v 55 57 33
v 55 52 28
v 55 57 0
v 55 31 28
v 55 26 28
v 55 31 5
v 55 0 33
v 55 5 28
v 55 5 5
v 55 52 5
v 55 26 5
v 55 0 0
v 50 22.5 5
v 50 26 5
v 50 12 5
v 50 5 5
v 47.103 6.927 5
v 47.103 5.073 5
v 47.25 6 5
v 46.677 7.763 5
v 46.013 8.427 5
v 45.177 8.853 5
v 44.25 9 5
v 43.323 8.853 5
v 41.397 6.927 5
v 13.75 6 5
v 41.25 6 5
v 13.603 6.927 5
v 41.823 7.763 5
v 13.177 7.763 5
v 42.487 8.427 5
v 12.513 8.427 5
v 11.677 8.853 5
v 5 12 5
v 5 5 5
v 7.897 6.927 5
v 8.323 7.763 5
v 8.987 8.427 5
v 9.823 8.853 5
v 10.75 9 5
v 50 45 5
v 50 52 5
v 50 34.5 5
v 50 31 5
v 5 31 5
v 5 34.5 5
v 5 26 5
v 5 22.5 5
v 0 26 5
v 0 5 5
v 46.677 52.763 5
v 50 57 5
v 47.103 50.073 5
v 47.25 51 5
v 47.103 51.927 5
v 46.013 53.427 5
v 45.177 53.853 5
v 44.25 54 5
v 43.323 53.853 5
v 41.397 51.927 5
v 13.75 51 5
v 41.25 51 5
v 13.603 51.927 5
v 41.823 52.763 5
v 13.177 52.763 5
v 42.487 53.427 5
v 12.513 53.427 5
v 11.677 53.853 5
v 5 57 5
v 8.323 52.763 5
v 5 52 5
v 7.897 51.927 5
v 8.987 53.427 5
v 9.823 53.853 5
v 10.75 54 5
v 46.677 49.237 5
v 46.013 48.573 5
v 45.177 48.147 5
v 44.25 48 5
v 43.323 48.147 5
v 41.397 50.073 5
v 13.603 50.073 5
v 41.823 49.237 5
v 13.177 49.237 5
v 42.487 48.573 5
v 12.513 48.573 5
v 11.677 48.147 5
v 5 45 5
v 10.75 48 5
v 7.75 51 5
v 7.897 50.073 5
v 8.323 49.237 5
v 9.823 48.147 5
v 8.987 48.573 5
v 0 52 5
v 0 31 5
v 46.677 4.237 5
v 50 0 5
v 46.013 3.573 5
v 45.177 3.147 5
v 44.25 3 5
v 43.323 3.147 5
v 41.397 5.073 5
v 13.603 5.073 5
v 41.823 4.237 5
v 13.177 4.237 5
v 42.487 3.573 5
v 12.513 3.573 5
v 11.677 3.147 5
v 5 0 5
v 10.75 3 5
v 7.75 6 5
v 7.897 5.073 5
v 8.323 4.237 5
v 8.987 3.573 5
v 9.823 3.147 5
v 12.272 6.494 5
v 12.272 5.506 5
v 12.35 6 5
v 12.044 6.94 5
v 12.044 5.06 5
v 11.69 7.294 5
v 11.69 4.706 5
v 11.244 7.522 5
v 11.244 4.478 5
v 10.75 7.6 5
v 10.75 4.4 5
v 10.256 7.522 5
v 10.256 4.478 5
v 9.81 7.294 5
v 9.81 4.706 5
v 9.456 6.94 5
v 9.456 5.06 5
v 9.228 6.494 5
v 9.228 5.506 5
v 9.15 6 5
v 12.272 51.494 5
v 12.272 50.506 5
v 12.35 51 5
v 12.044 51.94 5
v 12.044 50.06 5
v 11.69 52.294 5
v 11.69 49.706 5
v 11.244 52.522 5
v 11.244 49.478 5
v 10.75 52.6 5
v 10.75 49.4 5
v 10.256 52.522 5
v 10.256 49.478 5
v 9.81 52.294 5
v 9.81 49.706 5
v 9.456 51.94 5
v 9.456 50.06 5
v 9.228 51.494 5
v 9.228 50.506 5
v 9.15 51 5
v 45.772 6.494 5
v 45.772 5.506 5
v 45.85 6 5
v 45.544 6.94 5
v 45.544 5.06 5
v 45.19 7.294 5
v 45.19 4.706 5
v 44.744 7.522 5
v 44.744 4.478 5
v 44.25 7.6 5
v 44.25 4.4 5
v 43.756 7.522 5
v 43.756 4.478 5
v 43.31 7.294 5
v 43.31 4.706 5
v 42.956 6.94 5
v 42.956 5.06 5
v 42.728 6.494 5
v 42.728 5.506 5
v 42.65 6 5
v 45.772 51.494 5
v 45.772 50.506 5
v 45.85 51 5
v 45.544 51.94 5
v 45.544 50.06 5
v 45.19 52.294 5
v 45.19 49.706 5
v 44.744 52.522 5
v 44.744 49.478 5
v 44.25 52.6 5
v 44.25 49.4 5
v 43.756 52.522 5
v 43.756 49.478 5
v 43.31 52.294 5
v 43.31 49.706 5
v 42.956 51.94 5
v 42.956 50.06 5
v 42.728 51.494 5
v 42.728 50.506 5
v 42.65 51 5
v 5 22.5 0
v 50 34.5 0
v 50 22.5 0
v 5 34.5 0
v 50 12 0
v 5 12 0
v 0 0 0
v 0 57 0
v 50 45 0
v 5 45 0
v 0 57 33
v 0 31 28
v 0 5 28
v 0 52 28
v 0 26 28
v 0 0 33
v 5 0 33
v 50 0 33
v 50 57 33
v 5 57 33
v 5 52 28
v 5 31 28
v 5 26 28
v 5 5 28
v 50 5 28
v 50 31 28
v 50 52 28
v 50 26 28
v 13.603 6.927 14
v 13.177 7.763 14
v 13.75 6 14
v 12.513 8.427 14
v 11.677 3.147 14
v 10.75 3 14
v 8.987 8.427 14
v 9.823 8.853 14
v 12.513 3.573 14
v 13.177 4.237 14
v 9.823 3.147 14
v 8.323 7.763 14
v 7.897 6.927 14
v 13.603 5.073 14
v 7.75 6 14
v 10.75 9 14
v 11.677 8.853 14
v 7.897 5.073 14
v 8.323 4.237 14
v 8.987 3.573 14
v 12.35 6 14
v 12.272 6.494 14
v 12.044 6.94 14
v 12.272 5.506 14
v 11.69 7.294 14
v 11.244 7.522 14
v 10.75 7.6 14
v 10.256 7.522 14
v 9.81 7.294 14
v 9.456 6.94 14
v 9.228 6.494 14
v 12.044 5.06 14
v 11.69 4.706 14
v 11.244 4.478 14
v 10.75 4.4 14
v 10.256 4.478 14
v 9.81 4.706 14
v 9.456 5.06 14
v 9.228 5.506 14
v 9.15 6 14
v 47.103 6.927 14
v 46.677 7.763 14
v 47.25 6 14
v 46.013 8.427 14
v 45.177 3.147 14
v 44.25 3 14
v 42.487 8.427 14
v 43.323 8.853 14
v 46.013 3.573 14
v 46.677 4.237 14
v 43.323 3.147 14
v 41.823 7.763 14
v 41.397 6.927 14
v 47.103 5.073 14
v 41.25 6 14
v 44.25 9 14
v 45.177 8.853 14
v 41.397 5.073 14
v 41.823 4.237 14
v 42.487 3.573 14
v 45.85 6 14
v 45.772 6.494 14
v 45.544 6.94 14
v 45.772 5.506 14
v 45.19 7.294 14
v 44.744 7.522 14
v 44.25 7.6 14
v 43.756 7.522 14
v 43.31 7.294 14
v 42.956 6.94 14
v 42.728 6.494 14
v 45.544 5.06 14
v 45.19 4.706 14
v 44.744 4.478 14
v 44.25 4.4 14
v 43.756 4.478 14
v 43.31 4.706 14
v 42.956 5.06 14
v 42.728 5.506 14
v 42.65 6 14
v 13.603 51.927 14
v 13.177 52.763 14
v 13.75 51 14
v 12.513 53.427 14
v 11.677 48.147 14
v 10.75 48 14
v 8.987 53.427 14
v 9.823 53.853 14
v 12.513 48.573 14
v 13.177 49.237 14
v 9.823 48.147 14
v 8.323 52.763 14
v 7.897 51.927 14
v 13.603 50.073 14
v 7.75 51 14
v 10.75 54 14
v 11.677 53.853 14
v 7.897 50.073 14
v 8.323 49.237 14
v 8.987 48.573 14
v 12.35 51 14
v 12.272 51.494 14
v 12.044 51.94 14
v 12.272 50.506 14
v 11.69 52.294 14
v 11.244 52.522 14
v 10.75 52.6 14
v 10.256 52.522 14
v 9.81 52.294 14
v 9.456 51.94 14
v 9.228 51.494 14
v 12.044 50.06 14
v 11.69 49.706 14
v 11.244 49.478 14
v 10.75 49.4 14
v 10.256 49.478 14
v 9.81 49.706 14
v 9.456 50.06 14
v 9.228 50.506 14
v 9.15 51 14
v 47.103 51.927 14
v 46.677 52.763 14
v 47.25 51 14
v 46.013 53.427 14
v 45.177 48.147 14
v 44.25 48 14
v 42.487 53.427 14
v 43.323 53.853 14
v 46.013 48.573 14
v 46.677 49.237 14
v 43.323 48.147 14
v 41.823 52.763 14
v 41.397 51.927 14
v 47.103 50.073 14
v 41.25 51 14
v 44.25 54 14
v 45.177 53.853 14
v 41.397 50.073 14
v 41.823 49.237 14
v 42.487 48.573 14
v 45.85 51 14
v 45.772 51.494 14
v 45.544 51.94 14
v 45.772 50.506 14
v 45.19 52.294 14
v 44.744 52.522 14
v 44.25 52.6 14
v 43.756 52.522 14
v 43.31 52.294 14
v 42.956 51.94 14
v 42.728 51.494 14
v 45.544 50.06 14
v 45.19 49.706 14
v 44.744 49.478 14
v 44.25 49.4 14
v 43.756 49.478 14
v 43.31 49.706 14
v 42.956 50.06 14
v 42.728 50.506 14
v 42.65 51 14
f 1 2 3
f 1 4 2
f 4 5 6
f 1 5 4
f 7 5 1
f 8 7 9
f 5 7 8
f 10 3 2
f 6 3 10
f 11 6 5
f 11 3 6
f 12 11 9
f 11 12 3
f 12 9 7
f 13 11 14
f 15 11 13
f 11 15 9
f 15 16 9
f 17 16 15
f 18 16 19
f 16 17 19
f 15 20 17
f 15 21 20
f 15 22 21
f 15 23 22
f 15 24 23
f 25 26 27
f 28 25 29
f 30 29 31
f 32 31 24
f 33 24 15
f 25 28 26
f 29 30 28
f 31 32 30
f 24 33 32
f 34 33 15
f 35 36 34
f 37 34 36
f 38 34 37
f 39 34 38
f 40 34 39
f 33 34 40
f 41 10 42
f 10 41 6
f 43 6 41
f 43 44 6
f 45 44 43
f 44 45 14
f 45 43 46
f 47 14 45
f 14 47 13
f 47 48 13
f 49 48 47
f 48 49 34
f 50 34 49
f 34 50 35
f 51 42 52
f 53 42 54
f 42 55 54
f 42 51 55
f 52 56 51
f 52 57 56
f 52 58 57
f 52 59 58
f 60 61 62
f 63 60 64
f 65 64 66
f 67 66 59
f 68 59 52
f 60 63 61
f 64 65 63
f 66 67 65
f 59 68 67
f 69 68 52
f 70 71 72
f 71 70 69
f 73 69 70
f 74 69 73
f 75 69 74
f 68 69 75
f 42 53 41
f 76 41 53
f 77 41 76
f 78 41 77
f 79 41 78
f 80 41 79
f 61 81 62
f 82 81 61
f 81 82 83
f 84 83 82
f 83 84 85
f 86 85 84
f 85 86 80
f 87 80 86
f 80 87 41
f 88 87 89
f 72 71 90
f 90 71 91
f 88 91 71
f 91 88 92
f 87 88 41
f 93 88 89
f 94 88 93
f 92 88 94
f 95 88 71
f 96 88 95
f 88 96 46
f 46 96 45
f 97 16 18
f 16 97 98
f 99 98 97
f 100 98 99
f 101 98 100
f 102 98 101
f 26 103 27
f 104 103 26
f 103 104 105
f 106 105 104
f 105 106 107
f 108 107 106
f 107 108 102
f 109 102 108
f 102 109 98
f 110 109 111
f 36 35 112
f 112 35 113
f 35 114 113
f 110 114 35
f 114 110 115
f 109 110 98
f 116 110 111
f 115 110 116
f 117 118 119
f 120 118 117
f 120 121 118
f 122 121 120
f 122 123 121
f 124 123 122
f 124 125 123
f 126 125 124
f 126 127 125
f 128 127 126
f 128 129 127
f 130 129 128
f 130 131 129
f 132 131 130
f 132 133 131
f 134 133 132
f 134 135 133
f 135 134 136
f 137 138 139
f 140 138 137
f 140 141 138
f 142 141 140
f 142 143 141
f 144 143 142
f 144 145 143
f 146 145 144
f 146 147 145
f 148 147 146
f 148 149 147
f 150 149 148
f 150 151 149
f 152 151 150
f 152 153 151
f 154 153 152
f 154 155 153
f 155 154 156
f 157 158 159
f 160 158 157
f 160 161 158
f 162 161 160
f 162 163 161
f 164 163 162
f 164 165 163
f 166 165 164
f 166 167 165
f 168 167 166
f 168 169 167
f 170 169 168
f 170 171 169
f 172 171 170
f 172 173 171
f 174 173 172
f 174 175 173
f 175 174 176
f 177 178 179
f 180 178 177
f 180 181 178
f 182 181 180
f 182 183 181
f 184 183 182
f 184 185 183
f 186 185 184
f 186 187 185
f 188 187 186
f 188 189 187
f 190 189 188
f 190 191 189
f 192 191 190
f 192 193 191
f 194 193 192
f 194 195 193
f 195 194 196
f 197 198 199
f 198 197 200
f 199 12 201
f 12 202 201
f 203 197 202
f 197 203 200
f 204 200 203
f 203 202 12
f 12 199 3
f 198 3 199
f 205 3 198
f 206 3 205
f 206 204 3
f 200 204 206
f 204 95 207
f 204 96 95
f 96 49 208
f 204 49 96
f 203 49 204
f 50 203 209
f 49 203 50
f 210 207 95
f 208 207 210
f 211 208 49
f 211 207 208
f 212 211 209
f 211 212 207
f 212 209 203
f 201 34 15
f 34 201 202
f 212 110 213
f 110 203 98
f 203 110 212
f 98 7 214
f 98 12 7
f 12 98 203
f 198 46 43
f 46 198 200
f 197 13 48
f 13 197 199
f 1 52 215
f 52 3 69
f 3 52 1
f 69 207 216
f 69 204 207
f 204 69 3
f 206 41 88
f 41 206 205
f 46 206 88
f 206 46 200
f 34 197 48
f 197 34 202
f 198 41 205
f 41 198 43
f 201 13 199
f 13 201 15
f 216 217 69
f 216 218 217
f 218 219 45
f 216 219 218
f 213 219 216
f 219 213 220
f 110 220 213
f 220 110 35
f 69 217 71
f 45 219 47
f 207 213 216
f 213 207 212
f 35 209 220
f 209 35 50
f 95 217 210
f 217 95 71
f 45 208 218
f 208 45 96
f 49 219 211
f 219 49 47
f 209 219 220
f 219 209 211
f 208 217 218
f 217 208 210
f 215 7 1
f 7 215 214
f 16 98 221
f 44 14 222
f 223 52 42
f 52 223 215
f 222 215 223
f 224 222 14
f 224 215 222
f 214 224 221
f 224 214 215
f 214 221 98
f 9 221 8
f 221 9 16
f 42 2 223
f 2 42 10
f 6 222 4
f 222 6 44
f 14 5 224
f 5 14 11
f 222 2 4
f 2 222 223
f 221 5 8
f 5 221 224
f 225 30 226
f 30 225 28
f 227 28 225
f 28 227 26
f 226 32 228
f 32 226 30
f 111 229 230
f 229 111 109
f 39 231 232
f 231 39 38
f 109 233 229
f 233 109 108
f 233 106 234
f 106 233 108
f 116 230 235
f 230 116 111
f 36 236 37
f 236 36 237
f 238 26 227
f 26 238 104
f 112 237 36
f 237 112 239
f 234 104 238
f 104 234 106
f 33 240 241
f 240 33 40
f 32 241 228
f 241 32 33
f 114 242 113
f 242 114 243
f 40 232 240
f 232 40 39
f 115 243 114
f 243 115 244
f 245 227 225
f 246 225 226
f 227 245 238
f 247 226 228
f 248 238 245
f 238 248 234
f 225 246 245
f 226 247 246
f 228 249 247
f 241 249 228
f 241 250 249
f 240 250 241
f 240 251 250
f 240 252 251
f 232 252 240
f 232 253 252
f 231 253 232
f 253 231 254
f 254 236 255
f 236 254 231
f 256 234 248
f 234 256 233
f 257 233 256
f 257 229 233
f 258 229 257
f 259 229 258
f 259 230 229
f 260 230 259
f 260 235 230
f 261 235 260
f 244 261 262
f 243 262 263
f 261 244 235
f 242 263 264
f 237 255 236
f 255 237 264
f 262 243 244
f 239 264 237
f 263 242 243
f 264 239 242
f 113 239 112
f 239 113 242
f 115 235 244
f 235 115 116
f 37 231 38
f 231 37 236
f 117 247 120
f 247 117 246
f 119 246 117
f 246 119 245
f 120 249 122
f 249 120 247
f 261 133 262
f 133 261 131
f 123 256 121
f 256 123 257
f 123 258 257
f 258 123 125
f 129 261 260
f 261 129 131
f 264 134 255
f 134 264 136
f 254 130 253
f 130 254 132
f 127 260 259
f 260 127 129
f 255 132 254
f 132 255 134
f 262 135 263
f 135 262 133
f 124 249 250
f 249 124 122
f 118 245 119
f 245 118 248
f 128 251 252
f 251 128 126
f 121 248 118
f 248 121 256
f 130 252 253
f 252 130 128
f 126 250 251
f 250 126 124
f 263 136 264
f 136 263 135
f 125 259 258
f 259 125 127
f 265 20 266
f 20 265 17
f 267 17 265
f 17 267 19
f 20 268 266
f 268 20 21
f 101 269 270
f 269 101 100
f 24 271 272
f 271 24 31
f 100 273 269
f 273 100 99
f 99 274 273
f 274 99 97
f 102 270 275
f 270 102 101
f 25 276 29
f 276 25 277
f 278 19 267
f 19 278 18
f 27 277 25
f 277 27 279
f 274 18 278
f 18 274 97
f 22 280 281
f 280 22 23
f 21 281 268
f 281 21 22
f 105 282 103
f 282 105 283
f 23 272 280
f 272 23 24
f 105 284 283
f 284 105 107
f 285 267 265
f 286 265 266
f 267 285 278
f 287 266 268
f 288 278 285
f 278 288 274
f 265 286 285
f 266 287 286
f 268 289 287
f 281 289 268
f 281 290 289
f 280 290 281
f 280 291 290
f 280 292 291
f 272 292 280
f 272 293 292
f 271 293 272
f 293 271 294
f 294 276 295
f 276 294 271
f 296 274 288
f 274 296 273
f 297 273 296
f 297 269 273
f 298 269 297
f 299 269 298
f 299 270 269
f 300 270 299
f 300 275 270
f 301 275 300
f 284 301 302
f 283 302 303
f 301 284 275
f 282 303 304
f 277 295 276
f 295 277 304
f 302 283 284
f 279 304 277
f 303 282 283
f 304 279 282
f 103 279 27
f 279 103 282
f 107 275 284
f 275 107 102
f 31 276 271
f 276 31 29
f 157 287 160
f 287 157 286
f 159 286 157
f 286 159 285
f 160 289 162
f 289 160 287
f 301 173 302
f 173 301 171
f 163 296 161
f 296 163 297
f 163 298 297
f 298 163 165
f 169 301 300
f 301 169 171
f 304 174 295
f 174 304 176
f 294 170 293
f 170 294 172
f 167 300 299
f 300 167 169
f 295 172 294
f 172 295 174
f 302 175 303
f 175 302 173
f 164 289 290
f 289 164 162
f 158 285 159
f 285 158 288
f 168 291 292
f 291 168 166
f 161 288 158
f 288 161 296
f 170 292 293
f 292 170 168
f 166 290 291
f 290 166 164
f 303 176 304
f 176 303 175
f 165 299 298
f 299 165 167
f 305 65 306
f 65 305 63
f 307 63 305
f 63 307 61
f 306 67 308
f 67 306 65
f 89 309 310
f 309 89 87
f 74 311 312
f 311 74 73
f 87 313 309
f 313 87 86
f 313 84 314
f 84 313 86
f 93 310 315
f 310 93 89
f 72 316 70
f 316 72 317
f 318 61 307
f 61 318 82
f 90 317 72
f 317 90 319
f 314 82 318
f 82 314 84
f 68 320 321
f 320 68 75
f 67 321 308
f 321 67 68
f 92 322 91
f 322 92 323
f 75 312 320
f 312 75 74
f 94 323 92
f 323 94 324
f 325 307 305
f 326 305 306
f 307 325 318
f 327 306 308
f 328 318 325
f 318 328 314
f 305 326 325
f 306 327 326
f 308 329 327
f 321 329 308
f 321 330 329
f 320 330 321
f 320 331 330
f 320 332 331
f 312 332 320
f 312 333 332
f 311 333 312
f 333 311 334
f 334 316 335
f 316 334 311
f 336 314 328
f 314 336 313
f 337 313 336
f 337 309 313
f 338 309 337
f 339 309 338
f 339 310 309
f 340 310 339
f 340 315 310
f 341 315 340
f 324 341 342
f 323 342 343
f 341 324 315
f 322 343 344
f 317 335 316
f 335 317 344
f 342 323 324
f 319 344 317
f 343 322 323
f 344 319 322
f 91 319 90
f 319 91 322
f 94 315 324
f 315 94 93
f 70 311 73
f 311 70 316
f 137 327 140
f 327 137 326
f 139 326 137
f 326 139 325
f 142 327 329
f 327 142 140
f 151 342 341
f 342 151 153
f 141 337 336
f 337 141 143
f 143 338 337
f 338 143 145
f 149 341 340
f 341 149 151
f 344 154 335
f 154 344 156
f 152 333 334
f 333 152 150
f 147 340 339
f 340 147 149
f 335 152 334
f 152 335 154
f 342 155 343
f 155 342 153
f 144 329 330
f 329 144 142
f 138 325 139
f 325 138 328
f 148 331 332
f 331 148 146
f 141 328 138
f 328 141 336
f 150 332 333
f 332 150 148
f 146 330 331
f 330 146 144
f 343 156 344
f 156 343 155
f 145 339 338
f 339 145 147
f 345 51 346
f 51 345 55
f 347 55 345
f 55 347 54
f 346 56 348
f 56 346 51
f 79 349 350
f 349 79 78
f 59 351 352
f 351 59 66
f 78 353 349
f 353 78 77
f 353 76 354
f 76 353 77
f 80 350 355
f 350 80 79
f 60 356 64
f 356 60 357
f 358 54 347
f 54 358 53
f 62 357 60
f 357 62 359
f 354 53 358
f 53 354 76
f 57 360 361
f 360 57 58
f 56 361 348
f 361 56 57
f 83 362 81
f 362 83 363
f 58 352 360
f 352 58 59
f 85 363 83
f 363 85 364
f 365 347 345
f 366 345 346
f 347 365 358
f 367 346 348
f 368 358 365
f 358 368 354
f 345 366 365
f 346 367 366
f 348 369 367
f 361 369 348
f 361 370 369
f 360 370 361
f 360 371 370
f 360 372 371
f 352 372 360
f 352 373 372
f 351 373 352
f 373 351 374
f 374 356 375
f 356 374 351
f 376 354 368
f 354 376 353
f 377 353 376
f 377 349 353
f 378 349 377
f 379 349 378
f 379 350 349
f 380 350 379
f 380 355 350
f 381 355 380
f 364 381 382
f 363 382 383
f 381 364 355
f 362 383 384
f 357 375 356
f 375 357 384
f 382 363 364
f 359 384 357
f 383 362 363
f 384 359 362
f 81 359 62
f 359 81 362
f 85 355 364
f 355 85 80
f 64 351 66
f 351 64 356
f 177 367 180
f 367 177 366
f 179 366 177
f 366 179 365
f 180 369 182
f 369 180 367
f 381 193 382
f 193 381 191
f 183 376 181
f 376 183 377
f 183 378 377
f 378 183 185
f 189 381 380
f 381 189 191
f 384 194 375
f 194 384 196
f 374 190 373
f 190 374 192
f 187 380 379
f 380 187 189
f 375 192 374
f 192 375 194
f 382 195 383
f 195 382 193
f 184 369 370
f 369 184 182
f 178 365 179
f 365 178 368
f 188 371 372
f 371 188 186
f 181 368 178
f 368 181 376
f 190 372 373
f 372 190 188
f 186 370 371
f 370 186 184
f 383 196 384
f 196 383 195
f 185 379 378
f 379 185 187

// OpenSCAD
// Neato XV Signature Pro - Inner Left Pod
// Mounts: SunFounder 2-channel Relay Module
// Location: inner left (adjacent to center vent), viewed from behind robot
//
// ORIENTATION:
//   Bottom face = velcros to robot chassis (print this face on bed)
//   Posts extend upward (away from chassis)
//   Open: top, front, back
//   Protected: left and right sides with edge rails + center support post
//
// All measurements in mm. Print in PLA, no supports needed.

// ============================================================
// PARAMETERS
// ============================================================

// Relay board: 50.5mm long x 38.5mm wide (walls on long 50.5mm axis).
// Walls on X axis (long board dimension): pod_width = 38.5 + 3 + 3 + 5 + 5 = 55mm
// Open on Y axis (long board dimension): pod_depth = 50.5 + 3 + 3 = 57mm
pod_width  = 55;
pod_depth  = 57;
pod_height = 66;

rail_w = 5;
rib_w  = 12; // wide enough that standoff (6mm dia) sits fully centered with 3mm to spare each side

standoff_h    = 9;
standoff_od   = 6;
standoff_hole = 3.2; // M3 for relay

// Relay hole pattern: 45.0mm x 33.5mm (standard 2-ch relay module form factor)
// Standoffs placed at exactly these positions, centered in pod.
// Ribs move to match standoffs.
relay_hole_x_span = 33.5;  // short span — runs along X between walls
relay_hole_y_span = 45.0;  // long span — runs along Y open direction

relay_x_left  = (pod_width - relay_hole_x_span) / 2;  // 8.9mm from left
relay_x_right = relay_x_left + relay_hole_x_span;     // 61.1mm from left

relay_y_front = (pod_depth - relay_hole_y_span) / 2;  // 13.2mm from front
relay_y_rear  = relay_y_front + relay_hole_y_span;    // 49.8mm from front
relay_y_mid   = (relay_y_front + relay_y_rear) / 2;   // 31.5mm — center structural rib

// Ribs centered exactly on standoff Y positions
rib_positions = [relay_y_front, relay_y_mid, relay_y_rear];

relay_holes = [
    [relay_x_left,  relay_y_front],
    [relay_x_right, relay_y_front],
    [relay_x_left,  relay_y_rear ],
    [relay_x_right, relay_y_rear ],
];

// ============================================================
// MODULES
// ============================================================

module ribbed_bottom() {
    // Perimeter rails
    cube([rail_w, pod_depth, rail_w]);                     // left
    translate([pod_width - rail_w, 0, 0])
        cube([rail_w, pod_depth, rail_w]);                 // right
    cube([pod_width, rail_w, rail_w]);                     // back
    translate([0, pod_depth - rail_w, 0])
        cube([pod_width, rail_w, rail_w]);                 // front

    // Ribs centered on standoff Y positions
    for (y_center = rib_positions) {
        translate([0, y_center - rib_w / 2, 0])
            cube([pod_width, rib_w, rail_w]);
    }
}

module side_rails() {
    wall_h = pod_height / 2;  // half height — posts + single horizontal beam only

    // Left side
    cube([rail_w, rail_w, wall_h]);                                  // back post
    translate([0, pod_depth - rail_w, 0])
        cube([rail_w, rail_w, wall_h]);                              // front post
    translate([0, pod_depth / 2 - rail_w / 2, 0])
        cube([rail_w, rail_w, wall_h]);                              // center post
    translate([0, 0, wall_h - rail_w])
        cube([rail_w, pod_depth, rail_w]);                           // top horizontal

    // Right side (mirror)
    translate([pod_width - rail_w, 0, 0])
        cube([rail_w, rail_w, wall_h]);                              // back post
    translate([pod_width - rail_w, pod_depth - rail_w, 0])
        cube([rail_w, rail_w, wall_h]);                              // front post
    translate([pod_width - rail_w, pod_depth / 2 - rail_w / 2, 0])
        cube([rail_w, rail_w, wall_h]);                              // center post
    translate([pod_width - rail_w, 0, wall_h - rail_w])
        cube([rail_w, pod_depth, rail_w]);                           // top horizontal
}

module standoff(h, hole_d) {
    difference() {
        cylinder(h=h, d=standoff_od, $fn=20);
        cylinder(h=h + 0.1, d=hole_d, $fn=20);
    }
}

// ============================================================
// MAIN
// ============================================================

union() {
    ribbed_bottom();
    side_rails();

    for (h = relay_holes) {
        translate([h[0], h[1], rail_w])
            standoff(standoff_h, standoff_hole);
    }
}
